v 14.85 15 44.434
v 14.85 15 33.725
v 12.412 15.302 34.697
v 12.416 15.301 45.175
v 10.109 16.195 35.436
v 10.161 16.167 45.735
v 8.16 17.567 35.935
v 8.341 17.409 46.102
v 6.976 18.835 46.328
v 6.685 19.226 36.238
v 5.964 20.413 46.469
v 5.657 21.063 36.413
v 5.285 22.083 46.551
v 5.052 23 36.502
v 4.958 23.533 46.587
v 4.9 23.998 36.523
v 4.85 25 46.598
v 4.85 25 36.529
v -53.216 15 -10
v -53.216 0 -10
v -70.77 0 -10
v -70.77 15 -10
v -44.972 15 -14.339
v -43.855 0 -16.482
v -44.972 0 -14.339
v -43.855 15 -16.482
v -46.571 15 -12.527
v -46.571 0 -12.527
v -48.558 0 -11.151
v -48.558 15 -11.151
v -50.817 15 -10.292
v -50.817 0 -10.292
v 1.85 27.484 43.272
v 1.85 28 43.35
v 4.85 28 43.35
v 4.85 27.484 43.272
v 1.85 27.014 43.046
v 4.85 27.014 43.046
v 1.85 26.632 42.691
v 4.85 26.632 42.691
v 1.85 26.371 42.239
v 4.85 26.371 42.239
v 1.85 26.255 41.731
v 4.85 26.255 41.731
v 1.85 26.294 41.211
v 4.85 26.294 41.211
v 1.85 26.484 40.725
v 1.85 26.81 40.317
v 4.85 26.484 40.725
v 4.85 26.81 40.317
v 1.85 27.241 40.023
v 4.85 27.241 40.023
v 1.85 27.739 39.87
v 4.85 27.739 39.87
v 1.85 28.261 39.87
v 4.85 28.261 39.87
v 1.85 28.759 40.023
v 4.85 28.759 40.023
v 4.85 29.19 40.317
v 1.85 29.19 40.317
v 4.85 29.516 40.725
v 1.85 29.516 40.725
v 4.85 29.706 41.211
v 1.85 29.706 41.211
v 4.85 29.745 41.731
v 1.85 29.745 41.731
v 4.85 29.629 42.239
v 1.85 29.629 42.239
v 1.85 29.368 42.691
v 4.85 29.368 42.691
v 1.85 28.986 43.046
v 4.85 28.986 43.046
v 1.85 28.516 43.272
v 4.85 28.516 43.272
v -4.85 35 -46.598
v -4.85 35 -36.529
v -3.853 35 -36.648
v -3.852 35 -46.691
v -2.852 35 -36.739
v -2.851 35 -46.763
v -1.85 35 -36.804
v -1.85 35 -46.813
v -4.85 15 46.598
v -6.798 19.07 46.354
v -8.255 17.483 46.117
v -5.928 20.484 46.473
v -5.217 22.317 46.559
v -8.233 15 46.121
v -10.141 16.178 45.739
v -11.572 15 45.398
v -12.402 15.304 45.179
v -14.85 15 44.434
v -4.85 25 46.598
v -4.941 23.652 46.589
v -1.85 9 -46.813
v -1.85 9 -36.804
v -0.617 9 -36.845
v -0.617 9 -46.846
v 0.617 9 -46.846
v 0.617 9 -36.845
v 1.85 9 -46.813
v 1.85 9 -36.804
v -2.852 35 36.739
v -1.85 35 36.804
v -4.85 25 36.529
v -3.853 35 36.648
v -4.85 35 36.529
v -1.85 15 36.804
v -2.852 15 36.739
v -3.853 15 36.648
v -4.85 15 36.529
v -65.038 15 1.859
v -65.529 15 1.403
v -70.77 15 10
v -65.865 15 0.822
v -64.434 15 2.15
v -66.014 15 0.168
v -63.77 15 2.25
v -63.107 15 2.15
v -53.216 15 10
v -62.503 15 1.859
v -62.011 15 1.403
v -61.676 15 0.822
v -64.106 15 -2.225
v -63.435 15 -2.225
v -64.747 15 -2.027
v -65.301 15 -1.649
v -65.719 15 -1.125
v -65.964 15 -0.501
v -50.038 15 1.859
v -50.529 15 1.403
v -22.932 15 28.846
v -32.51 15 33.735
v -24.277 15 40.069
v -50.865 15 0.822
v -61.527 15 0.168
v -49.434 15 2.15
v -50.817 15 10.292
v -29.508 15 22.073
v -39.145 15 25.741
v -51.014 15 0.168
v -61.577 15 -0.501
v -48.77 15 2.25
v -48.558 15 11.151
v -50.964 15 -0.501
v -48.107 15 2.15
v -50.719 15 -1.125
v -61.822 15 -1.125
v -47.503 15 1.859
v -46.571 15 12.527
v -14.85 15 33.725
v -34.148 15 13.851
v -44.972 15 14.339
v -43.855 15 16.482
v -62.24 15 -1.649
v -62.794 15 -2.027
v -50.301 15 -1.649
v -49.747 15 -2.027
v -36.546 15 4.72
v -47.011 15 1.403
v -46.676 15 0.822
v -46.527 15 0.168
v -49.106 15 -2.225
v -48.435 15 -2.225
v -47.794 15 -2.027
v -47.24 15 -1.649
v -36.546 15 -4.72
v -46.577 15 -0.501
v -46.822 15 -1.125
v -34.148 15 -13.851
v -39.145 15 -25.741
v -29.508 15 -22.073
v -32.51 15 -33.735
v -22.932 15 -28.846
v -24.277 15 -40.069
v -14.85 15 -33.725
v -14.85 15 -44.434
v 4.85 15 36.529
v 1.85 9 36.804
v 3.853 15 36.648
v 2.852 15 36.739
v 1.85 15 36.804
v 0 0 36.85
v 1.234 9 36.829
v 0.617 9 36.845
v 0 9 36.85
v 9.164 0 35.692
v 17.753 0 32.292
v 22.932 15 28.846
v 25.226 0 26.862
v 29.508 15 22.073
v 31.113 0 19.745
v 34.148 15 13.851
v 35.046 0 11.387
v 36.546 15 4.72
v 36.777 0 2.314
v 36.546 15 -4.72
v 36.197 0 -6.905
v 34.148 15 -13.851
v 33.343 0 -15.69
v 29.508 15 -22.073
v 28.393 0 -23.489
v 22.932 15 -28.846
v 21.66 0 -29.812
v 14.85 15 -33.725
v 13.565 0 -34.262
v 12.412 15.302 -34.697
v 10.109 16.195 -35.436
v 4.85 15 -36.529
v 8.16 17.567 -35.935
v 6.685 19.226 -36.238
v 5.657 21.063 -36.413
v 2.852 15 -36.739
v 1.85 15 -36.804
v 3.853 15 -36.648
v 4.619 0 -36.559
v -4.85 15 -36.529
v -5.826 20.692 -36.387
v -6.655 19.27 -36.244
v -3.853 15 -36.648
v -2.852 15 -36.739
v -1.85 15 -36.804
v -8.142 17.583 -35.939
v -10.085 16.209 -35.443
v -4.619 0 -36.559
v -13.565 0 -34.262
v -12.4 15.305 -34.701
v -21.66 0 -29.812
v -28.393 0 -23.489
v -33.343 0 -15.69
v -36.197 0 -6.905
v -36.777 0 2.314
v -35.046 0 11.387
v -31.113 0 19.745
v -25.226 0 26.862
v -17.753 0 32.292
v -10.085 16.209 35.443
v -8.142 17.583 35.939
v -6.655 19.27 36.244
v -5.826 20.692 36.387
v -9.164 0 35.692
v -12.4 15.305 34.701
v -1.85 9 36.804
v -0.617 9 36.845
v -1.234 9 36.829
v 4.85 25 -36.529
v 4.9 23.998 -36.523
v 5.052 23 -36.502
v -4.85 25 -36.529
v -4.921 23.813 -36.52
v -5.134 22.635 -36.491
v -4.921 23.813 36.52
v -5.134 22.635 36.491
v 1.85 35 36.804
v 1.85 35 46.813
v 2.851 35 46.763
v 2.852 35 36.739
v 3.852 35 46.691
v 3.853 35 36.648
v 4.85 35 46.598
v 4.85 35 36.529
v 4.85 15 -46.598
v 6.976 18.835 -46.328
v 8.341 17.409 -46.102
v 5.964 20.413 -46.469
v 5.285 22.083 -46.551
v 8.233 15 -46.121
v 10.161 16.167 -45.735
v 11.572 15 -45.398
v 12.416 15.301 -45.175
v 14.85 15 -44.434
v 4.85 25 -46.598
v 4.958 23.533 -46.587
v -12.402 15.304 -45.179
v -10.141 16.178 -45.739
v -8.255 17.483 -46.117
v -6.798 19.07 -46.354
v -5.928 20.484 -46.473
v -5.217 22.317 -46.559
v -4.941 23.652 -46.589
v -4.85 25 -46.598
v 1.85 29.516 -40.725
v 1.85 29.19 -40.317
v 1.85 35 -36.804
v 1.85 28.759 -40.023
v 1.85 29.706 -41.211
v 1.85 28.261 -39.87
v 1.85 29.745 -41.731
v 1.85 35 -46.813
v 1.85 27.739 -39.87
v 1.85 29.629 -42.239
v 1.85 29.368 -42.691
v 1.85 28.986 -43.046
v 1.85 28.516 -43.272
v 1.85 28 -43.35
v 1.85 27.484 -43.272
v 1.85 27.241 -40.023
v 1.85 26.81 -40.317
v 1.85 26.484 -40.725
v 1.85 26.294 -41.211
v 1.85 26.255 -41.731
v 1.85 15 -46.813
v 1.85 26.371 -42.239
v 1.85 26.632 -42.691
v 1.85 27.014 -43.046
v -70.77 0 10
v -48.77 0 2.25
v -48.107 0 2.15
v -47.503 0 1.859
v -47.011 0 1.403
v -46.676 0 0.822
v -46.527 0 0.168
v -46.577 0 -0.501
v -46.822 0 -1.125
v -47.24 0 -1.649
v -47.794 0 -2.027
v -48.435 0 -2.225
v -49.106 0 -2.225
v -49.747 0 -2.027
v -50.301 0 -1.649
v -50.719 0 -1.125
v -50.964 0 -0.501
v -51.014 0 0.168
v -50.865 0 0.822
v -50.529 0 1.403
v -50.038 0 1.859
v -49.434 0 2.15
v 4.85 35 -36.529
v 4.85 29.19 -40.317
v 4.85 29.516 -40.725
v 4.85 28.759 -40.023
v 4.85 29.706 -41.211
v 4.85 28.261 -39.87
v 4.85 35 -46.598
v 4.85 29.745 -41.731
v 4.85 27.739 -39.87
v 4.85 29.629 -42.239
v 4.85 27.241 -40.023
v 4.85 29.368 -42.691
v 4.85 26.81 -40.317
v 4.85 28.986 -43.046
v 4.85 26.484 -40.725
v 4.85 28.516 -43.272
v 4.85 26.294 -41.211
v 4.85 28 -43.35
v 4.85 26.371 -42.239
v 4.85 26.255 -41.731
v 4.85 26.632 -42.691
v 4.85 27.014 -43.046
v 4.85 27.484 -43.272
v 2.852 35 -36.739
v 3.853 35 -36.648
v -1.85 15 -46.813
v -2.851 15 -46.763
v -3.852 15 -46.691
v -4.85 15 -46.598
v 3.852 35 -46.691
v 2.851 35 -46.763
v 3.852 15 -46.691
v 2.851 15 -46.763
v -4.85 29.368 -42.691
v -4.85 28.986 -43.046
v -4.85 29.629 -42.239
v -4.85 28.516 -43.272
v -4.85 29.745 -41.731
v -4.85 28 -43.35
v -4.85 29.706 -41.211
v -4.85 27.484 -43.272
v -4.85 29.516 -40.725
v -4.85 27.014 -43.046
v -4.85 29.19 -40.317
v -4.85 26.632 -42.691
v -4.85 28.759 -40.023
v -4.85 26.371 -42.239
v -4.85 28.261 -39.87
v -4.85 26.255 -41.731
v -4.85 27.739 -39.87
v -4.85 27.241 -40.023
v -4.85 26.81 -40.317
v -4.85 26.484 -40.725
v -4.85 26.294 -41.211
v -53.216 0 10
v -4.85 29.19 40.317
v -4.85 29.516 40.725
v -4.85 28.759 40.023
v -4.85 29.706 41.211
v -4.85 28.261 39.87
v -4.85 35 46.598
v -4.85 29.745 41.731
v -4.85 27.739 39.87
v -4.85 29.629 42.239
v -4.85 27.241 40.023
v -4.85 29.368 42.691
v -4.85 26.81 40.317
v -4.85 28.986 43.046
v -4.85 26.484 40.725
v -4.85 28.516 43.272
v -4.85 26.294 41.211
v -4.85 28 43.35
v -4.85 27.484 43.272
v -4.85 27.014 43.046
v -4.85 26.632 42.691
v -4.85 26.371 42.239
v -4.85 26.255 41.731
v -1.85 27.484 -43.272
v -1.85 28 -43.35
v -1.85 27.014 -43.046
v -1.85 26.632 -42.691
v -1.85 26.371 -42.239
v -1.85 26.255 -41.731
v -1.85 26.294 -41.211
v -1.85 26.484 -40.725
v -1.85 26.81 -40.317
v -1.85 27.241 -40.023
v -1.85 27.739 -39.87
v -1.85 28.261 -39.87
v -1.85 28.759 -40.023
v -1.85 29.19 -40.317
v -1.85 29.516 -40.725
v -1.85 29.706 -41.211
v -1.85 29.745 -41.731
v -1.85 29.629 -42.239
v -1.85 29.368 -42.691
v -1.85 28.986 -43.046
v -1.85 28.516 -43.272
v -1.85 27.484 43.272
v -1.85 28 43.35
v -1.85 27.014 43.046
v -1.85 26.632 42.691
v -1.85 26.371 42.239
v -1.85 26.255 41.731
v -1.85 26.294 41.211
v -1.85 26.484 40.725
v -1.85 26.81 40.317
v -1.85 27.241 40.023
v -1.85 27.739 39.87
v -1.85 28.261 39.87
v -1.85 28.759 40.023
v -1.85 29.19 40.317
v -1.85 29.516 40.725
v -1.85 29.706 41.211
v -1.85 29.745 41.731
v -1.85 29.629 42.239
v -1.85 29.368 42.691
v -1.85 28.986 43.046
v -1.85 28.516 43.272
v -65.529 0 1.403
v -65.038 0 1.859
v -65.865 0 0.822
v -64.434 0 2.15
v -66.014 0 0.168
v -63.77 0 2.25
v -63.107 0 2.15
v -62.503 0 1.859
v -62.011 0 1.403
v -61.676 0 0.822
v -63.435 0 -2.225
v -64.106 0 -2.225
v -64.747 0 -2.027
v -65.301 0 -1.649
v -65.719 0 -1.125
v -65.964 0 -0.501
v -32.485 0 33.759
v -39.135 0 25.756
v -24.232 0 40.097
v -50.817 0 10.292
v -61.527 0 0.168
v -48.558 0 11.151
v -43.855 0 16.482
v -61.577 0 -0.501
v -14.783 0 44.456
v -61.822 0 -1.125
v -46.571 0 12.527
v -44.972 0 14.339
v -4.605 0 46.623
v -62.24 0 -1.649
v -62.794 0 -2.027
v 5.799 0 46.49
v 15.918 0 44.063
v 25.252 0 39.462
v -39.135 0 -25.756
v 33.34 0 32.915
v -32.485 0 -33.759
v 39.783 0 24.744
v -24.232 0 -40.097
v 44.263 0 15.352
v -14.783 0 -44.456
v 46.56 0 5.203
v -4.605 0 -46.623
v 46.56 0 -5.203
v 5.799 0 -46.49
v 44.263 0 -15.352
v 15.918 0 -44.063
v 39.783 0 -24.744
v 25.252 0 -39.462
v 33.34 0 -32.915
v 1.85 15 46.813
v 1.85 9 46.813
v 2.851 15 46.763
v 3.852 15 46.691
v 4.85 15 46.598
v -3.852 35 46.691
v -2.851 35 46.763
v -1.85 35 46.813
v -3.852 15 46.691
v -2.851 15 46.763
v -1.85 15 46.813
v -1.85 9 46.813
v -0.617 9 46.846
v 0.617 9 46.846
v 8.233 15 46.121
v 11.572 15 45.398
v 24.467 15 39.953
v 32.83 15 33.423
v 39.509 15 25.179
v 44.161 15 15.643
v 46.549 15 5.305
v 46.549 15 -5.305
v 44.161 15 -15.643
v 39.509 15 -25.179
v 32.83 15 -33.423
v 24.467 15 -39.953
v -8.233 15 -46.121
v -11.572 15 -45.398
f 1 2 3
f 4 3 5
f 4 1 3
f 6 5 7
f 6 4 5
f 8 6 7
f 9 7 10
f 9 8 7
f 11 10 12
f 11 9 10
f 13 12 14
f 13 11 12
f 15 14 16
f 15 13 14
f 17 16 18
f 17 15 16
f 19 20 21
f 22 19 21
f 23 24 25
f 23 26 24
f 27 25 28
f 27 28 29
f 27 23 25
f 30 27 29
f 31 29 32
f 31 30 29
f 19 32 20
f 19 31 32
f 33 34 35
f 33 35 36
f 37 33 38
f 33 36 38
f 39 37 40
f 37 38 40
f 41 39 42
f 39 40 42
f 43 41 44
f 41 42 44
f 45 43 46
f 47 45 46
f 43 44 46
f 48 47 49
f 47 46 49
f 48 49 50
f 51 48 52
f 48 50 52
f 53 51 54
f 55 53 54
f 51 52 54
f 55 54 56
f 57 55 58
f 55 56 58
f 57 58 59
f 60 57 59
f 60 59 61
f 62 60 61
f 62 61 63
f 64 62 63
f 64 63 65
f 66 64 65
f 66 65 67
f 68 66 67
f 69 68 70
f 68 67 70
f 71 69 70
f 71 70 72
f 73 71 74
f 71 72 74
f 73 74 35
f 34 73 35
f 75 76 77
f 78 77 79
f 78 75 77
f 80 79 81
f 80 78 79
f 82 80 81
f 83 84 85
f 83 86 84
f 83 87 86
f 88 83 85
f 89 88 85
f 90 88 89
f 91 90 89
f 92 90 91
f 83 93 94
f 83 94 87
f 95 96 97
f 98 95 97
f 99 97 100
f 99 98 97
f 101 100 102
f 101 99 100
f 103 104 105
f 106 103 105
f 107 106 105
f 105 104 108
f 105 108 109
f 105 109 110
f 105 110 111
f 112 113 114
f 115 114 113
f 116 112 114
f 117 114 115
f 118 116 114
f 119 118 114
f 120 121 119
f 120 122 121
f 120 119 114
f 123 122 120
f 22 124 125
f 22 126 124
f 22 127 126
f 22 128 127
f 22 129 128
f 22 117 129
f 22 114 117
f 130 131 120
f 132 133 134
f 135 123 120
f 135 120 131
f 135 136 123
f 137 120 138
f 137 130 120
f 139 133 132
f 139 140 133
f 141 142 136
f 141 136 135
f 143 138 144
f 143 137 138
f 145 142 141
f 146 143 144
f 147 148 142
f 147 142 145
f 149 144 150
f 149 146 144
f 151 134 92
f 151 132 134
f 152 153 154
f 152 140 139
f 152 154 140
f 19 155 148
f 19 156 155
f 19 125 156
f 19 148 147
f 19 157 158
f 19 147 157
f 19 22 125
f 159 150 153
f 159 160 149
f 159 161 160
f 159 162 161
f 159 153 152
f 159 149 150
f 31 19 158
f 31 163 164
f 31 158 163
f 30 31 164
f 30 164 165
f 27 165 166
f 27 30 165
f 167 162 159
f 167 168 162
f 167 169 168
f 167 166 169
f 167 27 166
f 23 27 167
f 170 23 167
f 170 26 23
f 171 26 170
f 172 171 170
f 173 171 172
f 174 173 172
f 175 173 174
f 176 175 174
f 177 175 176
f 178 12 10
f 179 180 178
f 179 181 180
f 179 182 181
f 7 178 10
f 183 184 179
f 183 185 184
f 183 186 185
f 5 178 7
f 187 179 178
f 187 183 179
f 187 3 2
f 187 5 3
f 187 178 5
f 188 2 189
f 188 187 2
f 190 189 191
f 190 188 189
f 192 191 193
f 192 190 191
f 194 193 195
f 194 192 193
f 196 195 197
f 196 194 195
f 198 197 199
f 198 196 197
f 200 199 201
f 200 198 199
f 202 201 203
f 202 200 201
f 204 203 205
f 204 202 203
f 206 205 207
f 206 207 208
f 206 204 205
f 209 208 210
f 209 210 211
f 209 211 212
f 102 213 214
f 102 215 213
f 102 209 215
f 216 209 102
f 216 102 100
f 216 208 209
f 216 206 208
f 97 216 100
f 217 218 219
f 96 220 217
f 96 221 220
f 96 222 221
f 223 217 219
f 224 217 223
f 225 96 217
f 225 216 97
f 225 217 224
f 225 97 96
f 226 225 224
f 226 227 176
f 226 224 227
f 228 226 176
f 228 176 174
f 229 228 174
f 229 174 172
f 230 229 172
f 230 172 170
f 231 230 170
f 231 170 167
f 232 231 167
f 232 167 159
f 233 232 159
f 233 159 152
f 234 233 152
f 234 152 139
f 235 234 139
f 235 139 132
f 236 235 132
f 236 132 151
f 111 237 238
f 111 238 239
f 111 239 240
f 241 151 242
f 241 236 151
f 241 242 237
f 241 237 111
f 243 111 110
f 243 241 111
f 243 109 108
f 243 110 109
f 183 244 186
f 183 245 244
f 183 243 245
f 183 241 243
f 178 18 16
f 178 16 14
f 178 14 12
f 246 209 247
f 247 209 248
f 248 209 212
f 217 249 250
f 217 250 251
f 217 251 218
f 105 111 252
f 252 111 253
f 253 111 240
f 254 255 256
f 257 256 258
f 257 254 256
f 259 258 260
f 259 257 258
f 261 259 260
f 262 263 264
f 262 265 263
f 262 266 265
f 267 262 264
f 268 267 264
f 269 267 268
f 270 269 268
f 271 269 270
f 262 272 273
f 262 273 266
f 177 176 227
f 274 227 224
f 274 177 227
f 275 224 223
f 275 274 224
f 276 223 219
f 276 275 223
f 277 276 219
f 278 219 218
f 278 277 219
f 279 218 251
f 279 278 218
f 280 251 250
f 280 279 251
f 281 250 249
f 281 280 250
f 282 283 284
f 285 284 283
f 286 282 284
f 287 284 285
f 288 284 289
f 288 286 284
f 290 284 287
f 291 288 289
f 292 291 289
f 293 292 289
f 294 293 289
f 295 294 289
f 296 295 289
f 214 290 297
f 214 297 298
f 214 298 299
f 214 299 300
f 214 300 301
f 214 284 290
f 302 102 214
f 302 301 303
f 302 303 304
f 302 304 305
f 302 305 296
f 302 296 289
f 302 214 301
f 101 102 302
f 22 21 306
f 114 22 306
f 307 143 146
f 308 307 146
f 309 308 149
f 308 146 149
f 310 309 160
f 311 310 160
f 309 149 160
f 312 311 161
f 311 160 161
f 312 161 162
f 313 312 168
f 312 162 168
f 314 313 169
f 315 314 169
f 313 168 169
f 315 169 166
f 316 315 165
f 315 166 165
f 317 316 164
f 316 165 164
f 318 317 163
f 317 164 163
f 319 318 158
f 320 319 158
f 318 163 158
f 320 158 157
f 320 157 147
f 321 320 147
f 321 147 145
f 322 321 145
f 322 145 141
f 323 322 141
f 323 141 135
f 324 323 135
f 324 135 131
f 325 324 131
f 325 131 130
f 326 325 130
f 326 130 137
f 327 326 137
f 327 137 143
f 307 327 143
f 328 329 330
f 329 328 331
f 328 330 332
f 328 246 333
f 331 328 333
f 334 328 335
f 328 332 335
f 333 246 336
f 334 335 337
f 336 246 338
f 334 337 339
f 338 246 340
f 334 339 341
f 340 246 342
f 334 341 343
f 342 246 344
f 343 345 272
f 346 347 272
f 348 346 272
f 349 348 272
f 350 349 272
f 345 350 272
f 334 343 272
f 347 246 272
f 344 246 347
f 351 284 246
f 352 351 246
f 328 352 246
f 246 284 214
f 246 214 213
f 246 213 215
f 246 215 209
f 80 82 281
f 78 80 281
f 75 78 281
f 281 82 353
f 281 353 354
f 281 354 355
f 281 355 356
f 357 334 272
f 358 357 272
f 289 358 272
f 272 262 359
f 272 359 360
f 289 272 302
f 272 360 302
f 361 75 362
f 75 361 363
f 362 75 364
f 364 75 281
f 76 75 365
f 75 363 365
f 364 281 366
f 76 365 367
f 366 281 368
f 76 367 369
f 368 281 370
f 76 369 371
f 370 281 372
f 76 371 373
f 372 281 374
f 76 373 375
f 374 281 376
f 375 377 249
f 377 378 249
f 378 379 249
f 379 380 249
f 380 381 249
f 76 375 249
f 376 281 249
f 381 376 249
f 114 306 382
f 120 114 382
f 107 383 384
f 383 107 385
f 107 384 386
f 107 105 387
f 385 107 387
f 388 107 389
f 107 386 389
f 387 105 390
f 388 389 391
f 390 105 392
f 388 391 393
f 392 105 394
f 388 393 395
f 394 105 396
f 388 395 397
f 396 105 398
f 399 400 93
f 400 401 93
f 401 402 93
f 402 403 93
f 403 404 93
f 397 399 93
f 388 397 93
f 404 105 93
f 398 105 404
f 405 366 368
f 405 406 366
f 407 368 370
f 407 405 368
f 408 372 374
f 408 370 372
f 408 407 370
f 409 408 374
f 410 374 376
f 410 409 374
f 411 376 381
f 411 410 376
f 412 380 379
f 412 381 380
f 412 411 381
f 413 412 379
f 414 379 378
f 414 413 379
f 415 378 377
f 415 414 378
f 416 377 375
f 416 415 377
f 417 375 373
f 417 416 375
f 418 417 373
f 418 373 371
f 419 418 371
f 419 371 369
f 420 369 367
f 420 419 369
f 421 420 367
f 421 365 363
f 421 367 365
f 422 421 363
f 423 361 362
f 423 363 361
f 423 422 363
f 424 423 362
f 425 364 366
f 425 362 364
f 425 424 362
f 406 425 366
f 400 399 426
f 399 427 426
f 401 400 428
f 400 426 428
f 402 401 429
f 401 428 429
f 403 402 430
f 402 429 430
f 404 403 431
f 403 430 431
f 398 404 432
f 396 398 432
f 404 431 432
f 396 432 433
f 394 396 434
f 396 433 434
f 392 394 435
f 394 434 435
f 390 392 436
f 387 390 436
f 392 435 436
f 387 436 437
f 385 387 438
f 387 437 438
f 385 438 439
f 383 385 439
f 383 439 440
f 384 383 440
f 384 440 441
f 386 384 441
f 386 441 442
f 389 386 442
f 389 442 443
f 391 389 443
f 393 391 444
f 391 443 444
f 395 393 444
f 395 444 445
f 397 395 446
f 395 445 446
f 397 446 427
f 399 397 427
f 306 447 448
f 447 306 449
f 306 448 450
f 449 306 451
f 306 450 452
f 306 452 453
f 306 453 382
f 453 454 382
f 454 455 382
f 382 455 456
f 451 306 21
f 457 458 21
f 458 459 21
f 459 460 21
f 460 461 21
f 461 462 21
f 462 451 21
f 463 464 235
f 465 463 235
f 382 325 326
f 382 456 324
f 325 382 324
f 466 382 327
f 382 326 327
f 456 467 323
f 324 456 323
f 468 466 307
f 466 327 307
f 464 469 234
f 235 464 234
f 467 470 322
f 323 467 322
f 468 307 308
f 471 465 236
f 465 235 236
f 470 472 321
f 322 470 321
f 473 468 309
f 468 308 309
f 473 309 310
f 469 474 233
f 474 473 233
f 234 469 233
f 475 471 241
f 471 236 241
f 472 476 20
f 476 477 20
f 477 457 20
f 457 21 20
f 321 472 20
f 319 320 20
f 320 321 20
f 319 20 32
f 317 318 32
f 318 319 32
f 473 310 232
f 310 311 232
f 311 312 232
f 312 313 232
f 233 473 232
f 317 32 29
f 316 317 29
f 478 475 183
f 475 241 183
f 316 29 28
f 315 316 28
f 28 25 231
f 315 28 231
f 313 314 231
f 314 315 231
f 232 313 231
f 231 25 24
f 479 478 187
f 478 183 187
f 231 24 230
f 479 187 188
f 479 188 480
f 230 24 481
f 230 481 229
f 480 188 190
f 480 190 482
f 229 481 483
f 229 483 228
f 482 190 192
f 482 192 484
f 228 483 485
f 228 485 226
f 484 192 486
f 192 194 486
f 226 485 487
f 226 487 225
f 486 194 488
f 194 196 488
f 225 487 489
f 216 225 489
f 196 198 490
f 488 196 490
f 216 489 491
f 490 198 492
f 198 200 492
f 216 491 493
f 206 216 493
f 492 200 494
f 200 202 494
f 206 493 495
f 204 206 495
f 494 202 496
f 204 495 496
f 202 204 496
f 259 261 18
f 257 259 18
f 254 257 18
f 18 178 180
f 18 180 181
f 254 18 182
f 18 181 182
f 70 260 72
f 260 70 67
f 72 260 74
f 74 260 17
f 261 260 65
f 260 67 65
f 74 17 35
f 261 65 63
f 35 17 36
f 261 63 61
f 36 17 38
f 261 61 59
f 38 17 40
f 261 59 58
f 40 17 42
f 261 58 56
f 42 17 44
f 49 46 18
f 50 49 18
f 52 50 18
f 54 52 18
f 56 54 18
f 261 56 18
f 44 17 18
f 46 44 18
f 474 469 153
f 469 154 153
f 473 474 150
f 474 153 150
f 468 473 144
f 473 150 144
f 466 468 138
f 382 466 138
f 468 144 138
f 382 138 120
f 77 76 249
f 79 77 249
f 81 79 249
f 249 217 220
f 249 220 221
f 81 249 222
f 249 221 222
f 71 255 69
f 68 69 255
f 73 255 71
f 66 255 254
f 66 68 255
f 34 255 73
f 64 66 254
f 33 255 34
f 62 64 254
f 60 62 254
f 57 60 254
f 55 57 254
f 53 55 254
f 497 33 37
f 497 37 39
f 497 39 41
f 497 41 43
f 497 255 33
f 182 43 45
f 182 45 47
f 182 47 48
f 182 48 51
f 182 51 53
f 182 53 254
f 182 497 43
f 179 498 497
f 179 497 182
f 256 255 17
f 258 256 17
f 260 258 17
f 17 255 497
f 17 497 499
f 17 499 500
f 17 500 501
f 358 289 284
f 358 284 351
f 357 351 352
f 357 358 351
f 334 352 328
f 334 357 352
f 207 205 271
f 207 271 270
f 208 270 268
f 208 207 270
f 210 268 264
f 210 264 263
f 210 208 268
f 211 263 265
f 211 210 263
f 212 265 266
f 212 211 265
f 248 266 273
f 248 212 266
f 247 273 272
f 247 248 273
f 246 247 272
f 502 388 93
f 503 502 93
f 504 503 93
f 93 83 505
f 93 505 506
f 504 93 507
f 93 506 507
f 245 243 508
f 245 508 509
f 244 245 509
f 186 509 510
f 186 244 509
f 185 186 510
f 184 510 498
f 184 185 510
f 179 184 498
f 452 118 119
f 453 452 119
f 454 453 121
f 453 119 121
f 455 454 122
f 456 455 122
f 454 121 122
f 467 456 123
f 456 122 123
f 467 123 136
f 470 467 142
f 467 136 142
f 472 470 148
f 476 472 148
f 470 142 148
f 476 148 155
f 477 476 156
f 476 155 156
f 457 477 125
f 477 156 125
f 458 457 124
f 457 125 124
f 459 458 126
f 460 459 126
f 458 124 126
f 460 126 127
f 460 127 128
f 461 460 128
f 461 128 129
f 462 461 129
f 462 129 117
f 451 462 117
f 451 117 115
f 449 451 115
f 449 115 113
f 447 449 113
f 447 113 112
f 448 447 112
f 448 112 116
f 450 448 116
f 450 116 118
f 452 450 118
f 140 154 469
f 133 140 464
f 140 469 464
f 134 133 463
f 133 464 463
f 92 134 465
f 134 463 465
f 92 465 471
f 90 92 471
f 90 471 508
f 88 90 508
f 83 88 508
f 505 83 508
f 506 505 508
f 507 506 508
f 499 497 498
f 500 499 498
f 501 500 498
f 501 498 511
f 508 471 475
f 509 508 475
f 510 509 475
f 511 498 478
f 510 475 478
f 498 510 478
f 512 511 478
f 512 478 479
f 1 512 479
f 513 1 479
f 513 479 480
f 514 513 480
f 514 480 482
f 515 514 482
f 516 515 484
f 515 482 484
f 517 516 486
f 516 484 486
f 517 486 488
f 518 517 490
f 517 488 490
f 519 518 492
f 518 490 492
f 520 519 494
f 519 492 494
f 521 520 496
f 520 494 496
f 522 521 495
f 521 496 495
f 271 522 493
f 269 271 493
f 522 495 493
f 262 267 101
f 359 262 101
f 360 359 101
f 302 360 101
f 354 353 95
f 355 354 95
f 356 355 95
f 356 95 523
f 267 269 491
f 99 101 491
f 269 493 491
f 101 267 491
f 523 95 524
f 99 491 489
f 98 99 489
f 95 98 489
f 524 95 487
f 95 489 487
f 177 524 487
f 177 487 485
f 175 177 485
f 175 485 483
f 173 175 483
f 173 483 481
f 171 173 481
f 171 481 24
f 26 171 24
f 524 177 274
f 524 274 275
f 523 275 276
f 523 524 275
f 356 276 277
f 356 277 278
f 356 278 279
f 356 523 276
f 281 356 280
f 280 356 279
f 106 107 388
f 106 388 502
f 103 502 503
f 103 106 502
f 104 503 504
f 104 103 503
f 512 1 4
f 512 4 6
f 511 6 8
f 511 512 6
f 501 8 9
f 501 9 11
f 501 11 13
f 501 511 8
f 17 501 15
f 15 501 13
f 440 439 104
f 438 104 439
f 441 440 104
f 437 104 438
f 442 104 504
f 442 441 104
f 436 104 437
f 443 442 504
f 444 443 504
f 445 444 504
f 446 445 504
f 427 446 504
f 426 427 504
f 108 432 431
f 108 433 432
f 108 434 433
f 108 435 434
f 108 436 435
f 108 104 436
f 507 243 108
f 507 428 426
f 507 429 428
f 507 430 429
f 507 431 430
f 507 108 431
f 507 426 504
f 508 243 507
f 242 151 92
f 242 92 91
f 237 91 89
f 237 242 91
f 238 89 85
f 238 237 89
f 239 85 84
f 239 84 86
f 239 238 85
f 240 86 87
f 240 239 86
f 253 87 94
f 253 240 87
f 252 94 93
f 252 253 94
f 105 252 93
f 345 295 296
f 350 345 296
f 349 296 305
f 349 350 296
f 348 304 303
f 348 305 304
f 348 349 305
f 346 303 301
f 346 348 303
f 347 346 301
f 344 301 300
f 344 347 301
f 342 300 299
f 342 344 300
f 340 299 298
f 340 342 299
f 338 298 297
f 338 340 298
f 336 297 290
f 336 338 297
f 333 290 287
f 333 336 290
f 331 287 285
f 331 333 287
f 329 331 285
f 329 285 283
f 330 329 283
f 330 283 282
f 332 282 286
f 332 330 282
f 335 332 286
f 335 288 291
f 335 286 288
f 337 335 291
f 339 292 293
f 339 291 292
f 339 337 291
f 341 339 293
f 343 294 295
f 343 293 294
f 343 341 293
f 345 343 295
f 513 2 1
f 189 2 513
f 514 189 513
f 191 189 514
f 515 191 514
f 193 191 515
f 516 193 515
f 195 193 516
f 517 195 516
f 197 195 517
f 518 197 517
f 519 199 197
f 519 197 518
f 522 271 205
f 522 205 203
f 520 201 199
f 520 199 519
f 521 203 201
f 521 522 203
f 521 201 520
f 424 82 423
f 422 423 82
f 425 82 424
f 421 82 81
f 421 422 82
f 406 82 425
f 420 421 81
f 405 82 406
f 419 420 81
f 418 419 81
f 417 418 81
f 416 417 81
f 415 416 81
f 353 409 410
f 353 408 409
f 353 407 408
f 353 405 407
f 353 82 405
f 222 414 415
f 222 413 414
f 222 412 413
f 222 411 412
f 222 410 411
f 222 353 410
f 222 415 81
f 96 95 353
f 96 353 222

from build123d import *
from build123d.topology import SkipClean

# Parameters (mm, degrees)
SKETCH1_R           = 36.85
BOSS_EXTRUDE1_DEPTH = 15
SKETCH2_R           = 2.25
CUT_EXTRUDE1_DEPTH  = 87.187940965
BOSS_EXTRUDE2_DEPTH = 20
FILLET1_R           = 10
CUT_EXTRUDE2_START  = -6
CUT_EXTRUDE2_DEPTH  = 6
SKETCH5_R           = 1.75
CUT_EXTRUDE3_DEPTH  = 92.806106375
FILLET2_R           = 10


with BuildPart() as part:
    # Sketch1 → Boss-Extrude1 (new body)
    with BuildSketch(Plane(origin=(0, 0, 0), x_dir=(1, 0, 0), z_dir=(0, 1, 0))):
        with BuildLine():
            Line((-70.770323355, -10), (-45.770323355, -10))
            ThreePointArc((-45.770323355, -10), (46.85, 0), (-45.770323355, 10))
            Line((-45.770323355, 10), (-70.770323355, 10))
            Line((-70.770323355, 10), (-70.770323355, -10))
        make_face()
        with Locations(Location((0, 0, 0), (0, 0, 270))):
            Circle(SKETCH1_R, mode=Mode.SUBTRACT)
    extrude(amount=BOSS_EXTRUDE1_DEPTH)

    # Sketch2 → Cut-Extrude1 (cut, through all)
    with BuildSketch(Plane(origin=(0, 15, 0), x_dir=(1, 0, 0), z_dir=(0, 1, 0))):
        with Locations(Location((-63.770323355, 0, 0), (0, 0, 270))):
            Circle(SKETCH2_R)
        with Locations(Location((-48.770323355, 0, 0), (0, 0, 270))):
            Circle(SKETCH2_R)
    extrude(amount=-CUT_EXTRUDE1_DEPTH, mode=Mode.SUBTRACT)

    # Sketch3 → Boss-Extrude2 (add)
    with SkipClean():  # the faces are left unmerged after this step: merging them gives an invalid solid
        with BuildSketch(Plane(origin=(0, 15, 0), x_dir=(1, 0, 0), z_dir=(0, 1, 0))):
            with BuildLine():
                ThreePointArc((-1.85, -36.803532439), (-3.352802058, -36.697155453), (-4.85, -36.529440182))
                Line((-4.85, -36.529440182), (-4.85, -46.59828323))
                ThreePointArc((-4.85, -46.59828323), (-3.351727199, -46.729952116), (-1.85, -46.813459603))
                Line((-1.85, -46.813459603), (-1.85, -36.803532439))
            make_face()
            with BuildLine():
                ThreePointArc((1.85, -46.813459603), (3.351727199, -46.729952116), (4.85, -46.59828323))
                Line((4.85, -46.59828323), (4.85, -36.529440182))
                ThreePointArc((4.85, -36.529440182), (3.352802058, -36.697155453), (1.85, -36.803532439))
                Line((1.85, -36.803532439), (1.85, -46.813459603))
            make_face()
            with BuildLine():
                ThreePointArc((4.85, 46.59828323), (3.351727199, 46.729952116), (1.85, 46.813459603))
                Line((1.85, 46.813459603), (1.85, 36.803532439))
                ThreePointArc((1.85, 36.803532439), (3.352802058, 36.697155453), (4.85, 36.529440182))
                Line((4.85, 36.529440182), (4.85, 46.59828323))
            make_face()
            with BuildLine():
                Line((-1.85, 36.803532439), (-1.85, 46.813459603))
                ThreePointArc((-1.85, 46.813459603), (-3.351727199, 46.729952116), (-4.85, 46.59828323))
                Line((-4.85, 46.59828323), (-4.85, 36.529440182))
                ThreePointArc((-4.85, 36.529440182), (-3.352802058, 36.697155453), (-1.85, 36.803532439))
            make_face()
        extrude(amount=BOSS_EXTRUDE2_DEPTH)

    # Fillet1
    # the kernel refuses this fillet: 10 mm, written as the material it adds along each edge
    with BuildSketch(Plane(origin=(-4.85, 15, 11.529440182), x_dir=(-1, 0, 0), z_dir=(0, 0, 1))) as fillet1_piece_1_section:
        with BuildLine():
            CenterArc((FILLET1_R, -FILLET1_R), FILLET1_R, 90, 90)
            Line((0, -FILLET1_R), (0, 0))
            Line((0, 0), (FILLET1_R, 0))
        make_face()
    fillet1_piece_1 = extrude(amount=60.068843048, mode=Mode.PRIVATE)
    fillet1_piece_1 = fillet1_piece_1 & Plane(origin=(0, 17.250913244, 0), x_dir=(-0.9769546073589704, 0, 0.2134471718249741), z_dir=(0, -1, 0)) * Cylinder(46.85, 161, mode=Mode.PRIVATE)
    fillet1_piece_1 = fillet1_piece_1 - Plane(origin=(0, 17.250913244, 0), x_dir=(0, 0, 1), z_dir=(0, -1, 0)) * Cylinder(36.85, 161, mode=Mode.PRIVATE)
    with BuildSketch(Plane(origin=(4.85, 15, 71.59828323), x_dir=(1, 0, 0), z_dir=(0, 0, -1))) as fillet1_piece_2_section:
        with BuildLine():
            CenterArc((FILLET1_R, -FILLET1_R), FILLET1_R, 90, 90)
            Line((0, -FILLET1_R), (0, 0))
            Line((0, 0), (FILLET1_R, 0))
        make_face()
    fillet1_piece_2 = extrude(amount=60.068843048, mode=Mode.PRIVATE)
    fillet1_piece_2 = fillet1_piece_2 & Plane(origin=(0, 17.250905791, 0), x_dir=(-0.9769546073589704, 0, 0.2134471718249741), z_dir=(0, -1, 0)) * Cylinder(46.85, 161, mode=Mode.PRIVATE)
    fillet1_piece_2 = fillet1_piece_2 - Plane(origin=(0, 17.250905791, 0), x_dir=(0, 0, 1), z_dir=(0, -1, 0)) * Cylinder(36.85, 161, mode=Mode.PRIVATE)
    with BuildSketch(Plane(origin=(4.85, 15, -11.529440182), x_dir=(1, 0, 0), z_dir=(0, 0, -1))) as fillet1_piece_3_section:
        with BuildLine():
            CenterArc((FILLET1_R, -FILLET1_R), FILLET1_R, 90, 90)
            Line((0, -FILLET1_R), (0, 0))
            Line((0, 0), (FILLET1_R, 0))
        make_face()
    fillet1_piece_3 = extrude(amount=60.068843048, mode=Mode.PRIVATE)
    fillet1_piece_3 = fillet1_piece_3 & Plane(origin=(0, 17.250913244, 0), x_dir=(-0.9769546073589704, 0, 0.2134471718249741), z_dir=(0, -1, 0)) * Cylinder(46.85, 161, mode=Mode.PRIVATE)
    fillet1_piece_3 = fillet1_piece_3 - Plane(origin=(0, 17.250913244, 0), x_dir=(0, 0, 1), z_dir=(0, -1, 0)) * Cylinder(36.85, 161, mode=Mode.PRIVATE)
    with BuildSketch(Plane(origin=(-4.85, 15, -71.59828323), x_dir=(-1, 0, 0), z_dir=(0, 0, 1))) as fillet1_piece_4_section:
        with BuildLine():
            CenterArc((FILLET1_R, -FILLET1_R), FILLET1_R, 90, 90)
            Line((0, -FILLET1_R), (0, 0))
            Line((0, 0), (FILLET1_R, 0))
        make_face()
    fillet1_piece_4 = extrude(amount=60.068843048, mode=Mode.PRIVATE)
    fillet1_piece_4 = fillet1_piece_4 & Plane(origin=(0, 17.250905791, 0), x_dir=(-0.9769546073589704, 0, 0.2134471718249741), z_dir=(0, -1, 0)) * Cylinder(46.85, 161, mode=Mode.PRIVATE)
    fillet1_piece_4 = fillet1_piece_4 - Plane(origin=(0, 17.250905791, 0), x_dir=(0, 0, 1), z_dir=(0, -1, 0)) * Cylinder(36.85, 161, mode=Mode.PRIVATE)
    add([fillet1_piece_1, fillet1_piece_2, fillet1_piece_3, fillet1_piece_4])

    # Sketch4 → Cut-Extrude2 (cut)
    with BuildSketch(Plane(origin=(0, 15, 0), x_dir=(1, 0, 0), z_dir=(0, 1, 0)).offset(CUT_EXTRUDE2_START)):
        with BuildLine():
            Line((-1.85, 46.813459603), (-1.85, 36.803532439))
            ThreePointArc((-1.85, 36.803532439), (0, 36.85), (1.85, 36.803532439))
            Line((1.85, 36.803532439), (1.85, 46.813459603))
            ThreePointArc((1.85, 46.813459603), (0, 46.85), (-1.85, 46.813459603))
        make_face()
        with BuildLine():
            Line((1.85, -46.813459603), (1.85, -36.803532439))
            ThreePointArc((1.85, -36.803532439), (0, -36.85), (-1.85, -36.803532439))
            Line((-1.85, -36.803532439), (-1.85, -46.813459603))
            ThreePointArc((-1.85, -46.813459603), (0, -46.85), (1.85, -46.813459603))
        make_face()
    extrude(amount=CUT_EXTRUDE2_DEPTH, mode=Mode.SUBTRACT)

    # Sketch5 → Cut-Extrude3 (cut, symmetric)
    with BuildSketch(Plane(origin=(0, 0, 0), x_dir=(0, 0, -1), z_dir=(1, 0, 0))):
        with Locations(Location((-41.6, 28, 0), (0, 0, 180))):
            Circle(SKETCH5_R)
    cut_extrude3 = extrude(amount=CUT_EXTRUDE3_DEPTH, both=True, mode=Mode.SUBTRACT)

    # Fillet2
    fillet2_edges = [part.edges().sort_by_distance(p)[0] for p in [
        (-45.770323355, 7.5, 10),
        (-45.770323355, 7.5, -10),
    ]]
    fillet(fillet2_edges, radius=FILLET2_R)

    # Mirror1: Cut-Extrude3 across plane
    add(cut_extrude3.mirror(Plane.XY), mode=Mode.SUBTRACT)


solid = part.part
